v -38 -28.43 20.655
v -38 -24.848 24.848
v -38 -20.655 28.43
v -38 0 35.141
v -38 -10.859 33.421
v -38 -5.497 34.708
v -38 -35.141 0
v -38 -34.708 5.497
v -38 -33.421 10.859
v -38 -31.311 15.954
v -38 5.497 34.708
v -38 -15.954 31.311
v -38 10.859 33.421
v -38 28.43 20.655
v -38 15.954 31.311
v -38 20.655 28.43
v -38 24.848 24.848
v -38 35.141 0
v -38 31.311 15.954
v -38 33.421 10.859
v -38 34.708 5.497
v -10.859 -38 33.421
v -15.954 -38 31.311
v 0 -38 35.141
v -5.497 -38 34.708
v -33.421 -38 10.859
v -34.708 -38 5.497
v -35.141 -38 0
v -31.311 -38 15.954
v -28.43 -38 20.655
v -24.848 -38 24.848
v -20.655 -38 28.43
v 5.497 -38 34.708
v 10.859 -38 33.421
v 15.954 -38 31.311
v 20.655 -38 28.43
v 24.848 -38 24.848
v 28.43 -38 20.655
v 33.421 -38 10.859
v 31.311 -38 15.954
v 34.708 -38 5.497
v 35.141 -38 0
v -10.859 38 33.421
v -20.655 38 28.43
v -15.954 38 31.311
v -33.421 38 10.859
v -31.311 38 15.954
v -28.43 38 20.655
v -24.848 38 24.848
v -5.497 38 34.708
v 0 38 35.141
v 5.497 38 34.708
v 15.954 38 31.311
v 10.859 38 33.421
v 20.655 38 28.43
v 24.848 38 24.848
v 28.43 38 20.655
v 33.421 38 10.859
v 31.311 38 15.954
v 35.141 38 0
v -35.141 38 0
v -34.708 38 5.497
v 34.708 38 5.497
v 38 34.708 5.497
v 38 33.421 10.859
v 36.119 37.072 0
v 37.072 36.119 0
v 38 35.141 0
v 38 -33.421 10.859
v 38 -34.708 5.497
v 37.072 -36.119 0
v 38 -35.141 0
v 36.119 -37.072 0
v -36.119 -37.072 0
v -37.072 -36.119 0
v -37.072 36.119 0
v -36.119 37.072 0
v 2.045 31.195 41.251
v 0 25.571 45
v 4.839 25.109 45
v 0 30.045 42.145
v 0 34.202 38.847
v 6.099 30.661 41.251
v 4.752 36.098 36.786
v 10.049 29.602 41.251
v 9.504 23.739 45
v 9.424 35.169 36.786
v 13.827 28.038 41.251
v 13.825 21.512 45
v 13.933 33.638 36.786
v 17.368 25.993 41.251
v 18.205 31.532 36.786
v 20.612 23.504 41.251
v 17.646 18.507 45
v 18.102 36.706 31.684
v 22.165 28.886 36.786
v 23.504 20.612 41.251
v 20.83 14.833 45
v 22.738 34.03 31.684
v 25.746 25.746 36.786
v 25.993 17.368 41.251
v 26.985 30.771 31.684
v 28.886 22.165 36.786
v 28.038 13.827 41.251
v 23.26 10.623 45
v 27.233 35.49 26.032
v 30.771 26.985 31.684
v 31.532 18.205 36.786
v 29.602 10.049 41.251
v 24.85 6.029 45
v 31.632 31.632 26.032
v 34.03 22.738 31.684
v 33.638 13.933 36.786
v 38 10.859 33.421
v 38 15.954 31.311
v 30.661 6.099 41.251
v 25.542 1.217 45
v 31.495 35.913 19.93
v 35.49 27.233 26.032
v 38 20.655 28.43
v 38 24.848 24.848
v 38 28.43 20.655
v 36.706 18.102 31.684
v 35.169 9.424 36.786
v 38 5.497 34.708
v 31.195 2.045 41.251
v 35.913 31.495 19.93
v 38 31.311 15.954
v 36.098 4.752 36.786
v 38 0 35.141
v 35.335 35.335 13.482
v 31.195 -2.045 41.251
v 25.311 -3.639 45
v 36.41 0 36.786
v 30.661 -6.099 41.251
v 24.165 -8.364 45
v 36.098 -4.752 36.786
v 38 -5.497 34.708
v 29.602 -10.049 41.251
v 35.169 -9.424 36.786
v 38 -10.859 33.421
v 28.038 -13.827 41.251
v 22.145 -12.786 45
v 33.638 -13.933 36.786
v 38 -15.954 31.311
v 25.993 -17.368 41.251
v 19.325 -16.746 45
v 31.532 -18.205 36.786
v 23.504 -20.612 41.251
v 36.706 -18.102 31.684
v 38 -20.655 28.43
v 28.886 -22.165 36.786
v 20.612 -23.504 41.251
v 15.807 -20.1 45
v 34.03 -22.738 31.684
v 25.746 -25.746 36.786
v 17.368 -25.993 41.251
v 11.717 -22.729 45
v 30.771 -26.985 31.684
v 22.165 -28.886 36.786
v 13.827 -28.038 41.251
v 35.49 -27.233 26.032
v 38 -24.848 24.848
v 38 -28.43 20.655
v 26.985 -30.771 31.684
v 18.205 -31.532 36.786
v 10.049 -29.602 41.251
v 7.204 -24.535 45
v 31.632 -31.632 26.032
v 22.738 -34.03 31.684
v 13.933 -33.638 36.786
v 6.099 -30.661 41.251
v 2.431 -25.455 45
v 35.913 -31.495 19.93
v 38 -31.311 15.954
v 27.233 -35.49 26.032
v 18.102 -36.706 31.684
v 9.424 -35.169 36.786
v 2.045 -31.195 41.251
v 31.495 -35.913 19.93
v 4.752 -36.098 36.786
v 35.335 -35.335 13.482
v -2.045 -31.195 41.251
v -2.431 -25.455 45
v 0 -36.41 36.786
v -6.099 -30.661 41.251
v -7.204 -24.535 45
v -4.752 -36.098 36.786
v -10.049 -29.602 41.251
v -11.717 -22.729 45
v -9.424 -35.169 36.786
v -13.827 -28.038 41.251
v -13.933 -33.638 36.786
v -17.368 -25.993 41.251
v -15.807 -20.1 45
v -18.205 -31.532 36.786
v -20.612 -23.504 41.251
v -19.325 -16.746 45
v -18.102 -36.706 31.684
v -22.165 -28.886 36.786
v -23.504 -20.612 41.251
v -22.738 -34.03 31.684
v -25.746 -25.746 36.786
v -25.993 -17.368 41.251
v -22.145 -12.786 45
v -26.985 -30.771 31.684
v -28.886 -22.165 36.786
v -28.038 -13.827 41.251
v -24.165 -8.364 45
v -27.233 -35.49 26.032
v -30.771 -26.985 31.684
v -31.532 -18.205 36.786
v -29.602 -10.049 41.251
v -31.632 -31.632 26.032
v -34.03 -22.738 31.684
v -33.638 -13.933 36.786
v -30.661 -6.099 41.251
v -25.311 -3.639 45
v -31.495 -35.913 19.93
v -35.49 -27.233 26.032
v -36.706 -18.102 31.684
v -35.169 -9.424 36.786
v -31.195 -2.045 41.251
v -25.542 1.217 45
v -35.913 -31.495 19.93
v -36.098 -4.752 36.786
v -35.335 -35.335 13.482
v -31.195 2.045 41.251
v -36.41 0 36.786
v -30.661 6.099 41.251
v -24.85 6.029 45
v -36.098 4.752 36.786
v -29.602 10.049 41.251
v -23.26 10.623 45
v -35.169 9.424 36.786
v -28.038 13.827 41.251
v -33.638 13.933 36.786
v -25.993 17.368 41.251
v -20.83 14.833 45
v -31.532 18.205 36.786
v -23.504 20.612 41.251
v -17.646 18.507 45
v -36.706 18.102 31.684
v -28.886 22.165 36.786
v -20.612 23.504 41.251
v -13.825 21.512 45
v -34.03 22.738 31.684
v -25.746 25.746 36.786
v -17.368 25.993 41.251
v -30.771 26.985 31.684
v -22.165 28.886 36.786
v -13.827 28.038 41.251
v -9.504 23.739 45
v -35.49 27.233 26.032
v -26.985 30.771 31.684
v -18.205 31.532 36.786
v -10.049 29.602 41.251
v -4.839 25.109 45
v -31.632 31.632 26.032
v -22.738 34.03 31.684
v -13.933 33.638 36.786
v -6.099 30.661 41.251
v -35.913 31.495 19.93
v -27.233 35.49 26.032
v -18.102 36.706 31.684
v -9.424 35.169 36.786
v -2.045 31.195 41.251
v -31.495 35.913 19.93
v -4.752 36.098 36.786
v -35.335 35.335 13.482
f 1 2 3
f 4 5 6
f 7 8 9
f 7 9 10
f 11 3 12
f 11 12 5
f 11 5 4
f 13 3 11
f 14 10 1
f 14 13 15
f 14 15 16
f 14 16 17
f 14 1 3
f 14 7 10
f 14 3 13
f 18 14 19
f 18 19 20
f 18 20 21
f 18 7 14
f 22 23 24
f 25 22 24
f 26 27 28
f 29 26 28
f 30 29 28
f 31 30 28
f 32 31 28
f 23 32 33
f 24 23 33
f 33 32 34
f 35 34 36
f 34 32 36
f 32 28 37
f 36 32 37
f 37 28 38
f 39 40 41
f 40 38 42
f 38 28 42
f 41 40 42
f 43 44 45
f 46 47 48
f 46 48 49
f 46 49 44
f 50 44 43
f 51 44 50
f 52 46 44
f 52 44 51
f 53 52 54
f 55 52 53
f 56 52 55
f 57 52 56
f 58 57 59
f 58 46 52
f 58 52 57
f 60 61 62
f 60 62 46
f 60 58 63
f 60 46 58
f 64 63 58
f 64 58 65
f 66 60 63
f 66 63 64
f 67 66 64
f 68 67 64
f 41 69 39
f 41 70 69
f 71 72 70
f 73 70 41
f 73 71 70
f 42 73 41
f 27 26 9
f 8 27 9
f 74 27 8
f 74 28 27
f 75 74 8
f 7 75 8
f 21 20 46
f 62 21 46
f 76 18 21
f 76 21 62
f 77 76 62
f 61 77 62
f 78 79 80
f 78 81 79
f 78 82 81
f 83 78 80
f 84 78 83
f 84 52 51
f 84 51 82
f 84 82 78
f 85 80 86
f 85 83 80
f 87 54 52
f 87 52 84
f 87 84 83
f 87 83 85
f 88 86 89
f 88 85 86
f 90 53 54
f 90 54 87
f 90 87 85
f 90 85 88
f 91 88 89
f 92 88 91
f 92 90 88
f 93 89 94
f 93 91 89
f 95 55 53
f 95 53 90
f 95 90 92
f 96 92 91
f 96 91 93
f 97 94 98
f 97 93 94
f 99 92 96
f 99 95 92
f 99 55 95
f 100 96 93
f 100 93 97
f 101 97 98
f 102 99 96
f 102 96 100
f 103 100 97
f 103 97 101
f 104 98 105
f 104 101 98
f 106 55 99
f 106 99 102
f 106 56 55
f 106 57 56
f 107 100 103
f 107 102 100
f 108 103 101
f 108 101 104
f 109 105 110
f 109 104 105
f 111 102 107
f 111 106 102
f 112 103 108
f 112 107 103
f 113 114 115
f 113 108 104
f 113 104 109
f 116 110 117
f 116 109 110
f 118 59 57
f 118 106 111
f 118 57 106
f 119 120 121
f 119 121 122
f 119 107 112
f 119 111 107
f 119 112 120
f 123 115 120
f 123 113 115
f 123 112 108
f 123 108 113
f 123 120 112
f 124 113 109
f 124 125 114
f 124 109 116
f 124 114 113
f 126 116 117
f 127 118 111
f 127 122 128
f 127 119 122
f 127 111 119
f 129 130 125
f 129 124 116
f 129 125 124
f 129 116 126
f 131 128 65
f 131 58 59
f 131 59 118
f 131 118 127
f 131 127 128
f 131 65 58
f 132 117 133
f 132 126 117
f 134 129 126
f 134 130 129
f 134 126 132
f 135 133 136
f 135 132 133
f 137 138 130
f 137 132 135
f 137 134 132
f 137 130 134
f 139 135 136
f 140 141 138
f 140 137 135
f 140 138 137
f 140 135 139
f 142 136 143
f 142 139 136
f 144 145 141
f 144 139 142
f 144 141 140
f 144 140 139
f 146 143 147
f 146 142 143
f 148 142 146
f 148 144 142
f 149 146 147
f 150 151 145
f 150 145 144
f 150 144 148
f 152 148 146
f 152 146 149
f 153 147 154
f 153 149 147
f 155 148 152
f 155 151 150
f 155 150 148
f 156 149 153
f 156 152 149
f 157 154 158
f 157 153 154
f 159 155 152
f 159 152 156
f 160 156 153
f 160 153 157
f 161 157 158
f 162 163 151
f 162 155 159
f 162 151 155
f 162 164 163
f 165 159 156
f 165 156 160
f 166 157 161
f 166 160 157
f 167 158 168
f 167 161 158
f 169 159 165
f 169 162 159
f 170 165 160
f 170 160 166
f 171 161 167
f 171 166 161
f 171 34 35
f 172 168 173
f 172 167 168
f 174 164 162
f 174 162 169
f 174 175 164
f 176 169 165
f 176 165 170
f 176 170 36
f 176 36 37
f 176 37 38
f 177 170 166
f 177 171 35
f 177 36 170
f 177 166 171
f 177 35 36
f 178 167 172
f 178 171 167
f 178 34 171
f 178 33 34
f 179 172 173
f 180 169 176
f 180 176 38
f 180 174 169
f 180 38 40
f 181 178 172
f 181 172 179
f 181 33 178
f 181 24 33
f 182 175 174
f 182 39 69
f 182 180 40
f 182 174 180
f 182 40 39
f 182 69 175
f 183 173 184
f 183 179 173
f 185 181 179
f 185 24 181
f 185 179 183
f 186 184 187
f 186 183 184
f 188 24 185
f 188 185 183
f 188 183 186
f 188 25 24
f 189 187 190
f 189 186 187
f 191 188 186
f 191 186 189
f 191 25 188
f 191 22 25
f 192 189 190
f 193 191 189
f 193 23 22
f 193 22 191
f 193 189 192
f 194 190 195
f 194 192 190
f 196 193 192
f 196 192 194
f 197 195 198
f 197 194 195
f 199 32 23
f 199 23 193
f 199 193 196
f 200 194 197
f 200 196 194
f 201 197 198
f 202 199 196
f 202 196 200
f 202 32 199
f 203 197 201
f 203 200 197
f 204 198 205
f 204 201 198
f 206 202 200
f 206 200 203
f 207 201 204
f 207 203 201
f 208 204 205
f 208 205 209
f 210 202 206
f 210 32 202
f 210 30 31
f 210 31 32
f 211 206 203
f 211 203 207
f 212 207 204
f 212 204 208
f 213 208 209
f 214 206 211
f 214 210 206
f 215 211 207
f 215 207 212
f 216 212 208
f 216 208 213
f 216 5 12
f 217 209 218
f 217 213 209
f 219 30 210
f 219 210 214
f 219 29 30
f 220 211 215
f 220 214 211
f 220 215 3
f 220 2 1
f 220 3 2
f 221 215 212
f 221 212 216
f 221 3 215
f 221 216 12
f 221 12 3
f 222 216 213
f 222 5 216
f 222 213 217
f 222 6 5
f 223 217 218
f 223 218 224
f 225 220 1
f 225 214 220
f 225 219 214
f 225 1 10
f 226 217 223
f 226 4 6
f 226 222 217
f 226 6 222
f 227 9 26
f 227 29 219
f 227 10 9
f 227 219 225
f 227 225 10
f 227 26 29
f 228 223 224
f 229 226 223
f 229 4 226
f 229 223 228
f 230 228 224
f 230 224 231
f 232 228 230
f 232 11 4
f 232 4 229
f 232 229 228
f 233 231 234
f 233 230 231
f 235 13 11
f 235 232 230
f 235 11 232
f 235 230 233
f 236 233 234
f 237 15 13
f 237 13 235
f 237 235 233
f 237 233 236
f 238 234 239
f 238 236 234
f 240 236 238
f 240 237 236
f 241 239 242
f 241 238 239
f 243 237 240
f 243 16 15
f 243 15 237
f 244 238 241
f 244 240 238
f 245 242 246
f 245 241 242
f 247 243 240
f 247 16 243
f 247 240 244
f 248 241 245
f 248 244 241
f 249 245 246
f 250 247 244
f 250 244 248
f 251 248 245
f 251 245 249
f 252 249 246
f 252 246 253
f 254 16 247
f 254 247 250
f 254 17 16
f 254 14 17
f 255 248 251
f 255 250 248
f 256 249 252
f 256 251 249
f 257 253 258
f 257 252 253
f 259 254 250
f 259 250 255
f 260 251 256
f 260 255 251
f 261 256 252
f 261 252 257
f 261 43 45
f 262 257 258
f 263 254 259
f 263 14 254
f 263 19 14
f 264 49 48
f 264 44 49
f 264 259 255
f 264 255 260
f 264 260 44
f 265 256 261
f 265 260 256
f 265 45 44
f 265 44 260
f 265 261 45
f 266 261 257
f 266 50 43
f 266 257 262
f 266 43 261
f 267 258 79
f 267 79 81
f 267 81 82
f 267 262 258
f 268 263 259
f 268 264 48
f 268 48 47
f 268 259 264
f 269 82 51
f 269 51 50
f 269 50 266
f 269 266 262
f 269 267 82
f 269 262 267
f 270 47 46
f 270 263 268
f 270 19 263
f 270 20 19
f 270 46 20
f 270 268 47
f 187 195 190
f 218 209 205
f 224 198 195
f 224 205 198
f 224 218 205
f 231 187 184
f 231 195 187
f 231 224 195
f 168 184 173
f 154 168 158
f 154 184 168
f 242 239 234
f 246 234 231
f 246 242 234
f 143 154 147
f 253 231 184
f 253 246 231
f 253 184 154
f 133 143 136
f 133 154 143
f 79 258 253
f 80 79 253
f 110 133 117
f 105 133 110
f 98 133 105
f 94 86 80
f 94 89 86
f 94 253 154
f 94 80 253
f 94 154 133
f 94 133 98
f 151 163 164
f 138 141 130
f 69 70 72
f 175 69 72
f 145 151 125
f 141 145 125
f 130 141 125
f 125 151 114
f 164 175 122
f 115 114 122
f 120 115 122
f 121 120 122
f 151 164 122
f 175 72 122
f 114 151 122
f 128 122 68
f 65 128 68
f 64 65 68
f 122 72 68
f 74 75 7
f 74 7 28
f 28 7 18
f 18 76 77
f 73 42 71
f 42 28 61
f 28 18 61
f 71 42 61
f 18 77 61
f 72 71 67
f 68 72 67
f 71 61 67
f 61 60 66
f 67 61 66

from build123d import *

# Parameters (mm, degrees)
ESBO_O4_W                = 76
ESBO_O4_H                = 76
RESSALTO_EXTRUS_O2_DEPTH = 45


with BuildPart() as part:
    # Esboço4 → Ressalto-extrusão2 (new body)
    with BuildSketch(Plane.XY):
        Rectangle(ESBO_O4_W, ESBO_O4_H)
    extrude(amount=RESSALTO_EXTRUS_O2_DEPTH)

    # Esboço5 → Corte-Revolução2 (revolve, cut)
    with BuildSketch(Plane(origin=(0, 0, 0), x_dir=(0, 0, -1), z_dir=(1, 0, 0))):
        with BuildLine():
            Line((-104.6568392, 0), (-51.757946877, 0))
            ThreePointArc((-51.757946877, 0), (0, 51.757946877), (51.757946877, 0))
            Line((51.757946877, 0), (104.6568392, 0))
            ThreePointArc((104.6568392, 0), (0, 104.6568392), (-104.6568392, 0))
        make_face()
    revolve(axis=Axis((0, 0, 104.6568392), (0, 0, -1)), mode=Mode.SUBTRACT)


solid = part.part
